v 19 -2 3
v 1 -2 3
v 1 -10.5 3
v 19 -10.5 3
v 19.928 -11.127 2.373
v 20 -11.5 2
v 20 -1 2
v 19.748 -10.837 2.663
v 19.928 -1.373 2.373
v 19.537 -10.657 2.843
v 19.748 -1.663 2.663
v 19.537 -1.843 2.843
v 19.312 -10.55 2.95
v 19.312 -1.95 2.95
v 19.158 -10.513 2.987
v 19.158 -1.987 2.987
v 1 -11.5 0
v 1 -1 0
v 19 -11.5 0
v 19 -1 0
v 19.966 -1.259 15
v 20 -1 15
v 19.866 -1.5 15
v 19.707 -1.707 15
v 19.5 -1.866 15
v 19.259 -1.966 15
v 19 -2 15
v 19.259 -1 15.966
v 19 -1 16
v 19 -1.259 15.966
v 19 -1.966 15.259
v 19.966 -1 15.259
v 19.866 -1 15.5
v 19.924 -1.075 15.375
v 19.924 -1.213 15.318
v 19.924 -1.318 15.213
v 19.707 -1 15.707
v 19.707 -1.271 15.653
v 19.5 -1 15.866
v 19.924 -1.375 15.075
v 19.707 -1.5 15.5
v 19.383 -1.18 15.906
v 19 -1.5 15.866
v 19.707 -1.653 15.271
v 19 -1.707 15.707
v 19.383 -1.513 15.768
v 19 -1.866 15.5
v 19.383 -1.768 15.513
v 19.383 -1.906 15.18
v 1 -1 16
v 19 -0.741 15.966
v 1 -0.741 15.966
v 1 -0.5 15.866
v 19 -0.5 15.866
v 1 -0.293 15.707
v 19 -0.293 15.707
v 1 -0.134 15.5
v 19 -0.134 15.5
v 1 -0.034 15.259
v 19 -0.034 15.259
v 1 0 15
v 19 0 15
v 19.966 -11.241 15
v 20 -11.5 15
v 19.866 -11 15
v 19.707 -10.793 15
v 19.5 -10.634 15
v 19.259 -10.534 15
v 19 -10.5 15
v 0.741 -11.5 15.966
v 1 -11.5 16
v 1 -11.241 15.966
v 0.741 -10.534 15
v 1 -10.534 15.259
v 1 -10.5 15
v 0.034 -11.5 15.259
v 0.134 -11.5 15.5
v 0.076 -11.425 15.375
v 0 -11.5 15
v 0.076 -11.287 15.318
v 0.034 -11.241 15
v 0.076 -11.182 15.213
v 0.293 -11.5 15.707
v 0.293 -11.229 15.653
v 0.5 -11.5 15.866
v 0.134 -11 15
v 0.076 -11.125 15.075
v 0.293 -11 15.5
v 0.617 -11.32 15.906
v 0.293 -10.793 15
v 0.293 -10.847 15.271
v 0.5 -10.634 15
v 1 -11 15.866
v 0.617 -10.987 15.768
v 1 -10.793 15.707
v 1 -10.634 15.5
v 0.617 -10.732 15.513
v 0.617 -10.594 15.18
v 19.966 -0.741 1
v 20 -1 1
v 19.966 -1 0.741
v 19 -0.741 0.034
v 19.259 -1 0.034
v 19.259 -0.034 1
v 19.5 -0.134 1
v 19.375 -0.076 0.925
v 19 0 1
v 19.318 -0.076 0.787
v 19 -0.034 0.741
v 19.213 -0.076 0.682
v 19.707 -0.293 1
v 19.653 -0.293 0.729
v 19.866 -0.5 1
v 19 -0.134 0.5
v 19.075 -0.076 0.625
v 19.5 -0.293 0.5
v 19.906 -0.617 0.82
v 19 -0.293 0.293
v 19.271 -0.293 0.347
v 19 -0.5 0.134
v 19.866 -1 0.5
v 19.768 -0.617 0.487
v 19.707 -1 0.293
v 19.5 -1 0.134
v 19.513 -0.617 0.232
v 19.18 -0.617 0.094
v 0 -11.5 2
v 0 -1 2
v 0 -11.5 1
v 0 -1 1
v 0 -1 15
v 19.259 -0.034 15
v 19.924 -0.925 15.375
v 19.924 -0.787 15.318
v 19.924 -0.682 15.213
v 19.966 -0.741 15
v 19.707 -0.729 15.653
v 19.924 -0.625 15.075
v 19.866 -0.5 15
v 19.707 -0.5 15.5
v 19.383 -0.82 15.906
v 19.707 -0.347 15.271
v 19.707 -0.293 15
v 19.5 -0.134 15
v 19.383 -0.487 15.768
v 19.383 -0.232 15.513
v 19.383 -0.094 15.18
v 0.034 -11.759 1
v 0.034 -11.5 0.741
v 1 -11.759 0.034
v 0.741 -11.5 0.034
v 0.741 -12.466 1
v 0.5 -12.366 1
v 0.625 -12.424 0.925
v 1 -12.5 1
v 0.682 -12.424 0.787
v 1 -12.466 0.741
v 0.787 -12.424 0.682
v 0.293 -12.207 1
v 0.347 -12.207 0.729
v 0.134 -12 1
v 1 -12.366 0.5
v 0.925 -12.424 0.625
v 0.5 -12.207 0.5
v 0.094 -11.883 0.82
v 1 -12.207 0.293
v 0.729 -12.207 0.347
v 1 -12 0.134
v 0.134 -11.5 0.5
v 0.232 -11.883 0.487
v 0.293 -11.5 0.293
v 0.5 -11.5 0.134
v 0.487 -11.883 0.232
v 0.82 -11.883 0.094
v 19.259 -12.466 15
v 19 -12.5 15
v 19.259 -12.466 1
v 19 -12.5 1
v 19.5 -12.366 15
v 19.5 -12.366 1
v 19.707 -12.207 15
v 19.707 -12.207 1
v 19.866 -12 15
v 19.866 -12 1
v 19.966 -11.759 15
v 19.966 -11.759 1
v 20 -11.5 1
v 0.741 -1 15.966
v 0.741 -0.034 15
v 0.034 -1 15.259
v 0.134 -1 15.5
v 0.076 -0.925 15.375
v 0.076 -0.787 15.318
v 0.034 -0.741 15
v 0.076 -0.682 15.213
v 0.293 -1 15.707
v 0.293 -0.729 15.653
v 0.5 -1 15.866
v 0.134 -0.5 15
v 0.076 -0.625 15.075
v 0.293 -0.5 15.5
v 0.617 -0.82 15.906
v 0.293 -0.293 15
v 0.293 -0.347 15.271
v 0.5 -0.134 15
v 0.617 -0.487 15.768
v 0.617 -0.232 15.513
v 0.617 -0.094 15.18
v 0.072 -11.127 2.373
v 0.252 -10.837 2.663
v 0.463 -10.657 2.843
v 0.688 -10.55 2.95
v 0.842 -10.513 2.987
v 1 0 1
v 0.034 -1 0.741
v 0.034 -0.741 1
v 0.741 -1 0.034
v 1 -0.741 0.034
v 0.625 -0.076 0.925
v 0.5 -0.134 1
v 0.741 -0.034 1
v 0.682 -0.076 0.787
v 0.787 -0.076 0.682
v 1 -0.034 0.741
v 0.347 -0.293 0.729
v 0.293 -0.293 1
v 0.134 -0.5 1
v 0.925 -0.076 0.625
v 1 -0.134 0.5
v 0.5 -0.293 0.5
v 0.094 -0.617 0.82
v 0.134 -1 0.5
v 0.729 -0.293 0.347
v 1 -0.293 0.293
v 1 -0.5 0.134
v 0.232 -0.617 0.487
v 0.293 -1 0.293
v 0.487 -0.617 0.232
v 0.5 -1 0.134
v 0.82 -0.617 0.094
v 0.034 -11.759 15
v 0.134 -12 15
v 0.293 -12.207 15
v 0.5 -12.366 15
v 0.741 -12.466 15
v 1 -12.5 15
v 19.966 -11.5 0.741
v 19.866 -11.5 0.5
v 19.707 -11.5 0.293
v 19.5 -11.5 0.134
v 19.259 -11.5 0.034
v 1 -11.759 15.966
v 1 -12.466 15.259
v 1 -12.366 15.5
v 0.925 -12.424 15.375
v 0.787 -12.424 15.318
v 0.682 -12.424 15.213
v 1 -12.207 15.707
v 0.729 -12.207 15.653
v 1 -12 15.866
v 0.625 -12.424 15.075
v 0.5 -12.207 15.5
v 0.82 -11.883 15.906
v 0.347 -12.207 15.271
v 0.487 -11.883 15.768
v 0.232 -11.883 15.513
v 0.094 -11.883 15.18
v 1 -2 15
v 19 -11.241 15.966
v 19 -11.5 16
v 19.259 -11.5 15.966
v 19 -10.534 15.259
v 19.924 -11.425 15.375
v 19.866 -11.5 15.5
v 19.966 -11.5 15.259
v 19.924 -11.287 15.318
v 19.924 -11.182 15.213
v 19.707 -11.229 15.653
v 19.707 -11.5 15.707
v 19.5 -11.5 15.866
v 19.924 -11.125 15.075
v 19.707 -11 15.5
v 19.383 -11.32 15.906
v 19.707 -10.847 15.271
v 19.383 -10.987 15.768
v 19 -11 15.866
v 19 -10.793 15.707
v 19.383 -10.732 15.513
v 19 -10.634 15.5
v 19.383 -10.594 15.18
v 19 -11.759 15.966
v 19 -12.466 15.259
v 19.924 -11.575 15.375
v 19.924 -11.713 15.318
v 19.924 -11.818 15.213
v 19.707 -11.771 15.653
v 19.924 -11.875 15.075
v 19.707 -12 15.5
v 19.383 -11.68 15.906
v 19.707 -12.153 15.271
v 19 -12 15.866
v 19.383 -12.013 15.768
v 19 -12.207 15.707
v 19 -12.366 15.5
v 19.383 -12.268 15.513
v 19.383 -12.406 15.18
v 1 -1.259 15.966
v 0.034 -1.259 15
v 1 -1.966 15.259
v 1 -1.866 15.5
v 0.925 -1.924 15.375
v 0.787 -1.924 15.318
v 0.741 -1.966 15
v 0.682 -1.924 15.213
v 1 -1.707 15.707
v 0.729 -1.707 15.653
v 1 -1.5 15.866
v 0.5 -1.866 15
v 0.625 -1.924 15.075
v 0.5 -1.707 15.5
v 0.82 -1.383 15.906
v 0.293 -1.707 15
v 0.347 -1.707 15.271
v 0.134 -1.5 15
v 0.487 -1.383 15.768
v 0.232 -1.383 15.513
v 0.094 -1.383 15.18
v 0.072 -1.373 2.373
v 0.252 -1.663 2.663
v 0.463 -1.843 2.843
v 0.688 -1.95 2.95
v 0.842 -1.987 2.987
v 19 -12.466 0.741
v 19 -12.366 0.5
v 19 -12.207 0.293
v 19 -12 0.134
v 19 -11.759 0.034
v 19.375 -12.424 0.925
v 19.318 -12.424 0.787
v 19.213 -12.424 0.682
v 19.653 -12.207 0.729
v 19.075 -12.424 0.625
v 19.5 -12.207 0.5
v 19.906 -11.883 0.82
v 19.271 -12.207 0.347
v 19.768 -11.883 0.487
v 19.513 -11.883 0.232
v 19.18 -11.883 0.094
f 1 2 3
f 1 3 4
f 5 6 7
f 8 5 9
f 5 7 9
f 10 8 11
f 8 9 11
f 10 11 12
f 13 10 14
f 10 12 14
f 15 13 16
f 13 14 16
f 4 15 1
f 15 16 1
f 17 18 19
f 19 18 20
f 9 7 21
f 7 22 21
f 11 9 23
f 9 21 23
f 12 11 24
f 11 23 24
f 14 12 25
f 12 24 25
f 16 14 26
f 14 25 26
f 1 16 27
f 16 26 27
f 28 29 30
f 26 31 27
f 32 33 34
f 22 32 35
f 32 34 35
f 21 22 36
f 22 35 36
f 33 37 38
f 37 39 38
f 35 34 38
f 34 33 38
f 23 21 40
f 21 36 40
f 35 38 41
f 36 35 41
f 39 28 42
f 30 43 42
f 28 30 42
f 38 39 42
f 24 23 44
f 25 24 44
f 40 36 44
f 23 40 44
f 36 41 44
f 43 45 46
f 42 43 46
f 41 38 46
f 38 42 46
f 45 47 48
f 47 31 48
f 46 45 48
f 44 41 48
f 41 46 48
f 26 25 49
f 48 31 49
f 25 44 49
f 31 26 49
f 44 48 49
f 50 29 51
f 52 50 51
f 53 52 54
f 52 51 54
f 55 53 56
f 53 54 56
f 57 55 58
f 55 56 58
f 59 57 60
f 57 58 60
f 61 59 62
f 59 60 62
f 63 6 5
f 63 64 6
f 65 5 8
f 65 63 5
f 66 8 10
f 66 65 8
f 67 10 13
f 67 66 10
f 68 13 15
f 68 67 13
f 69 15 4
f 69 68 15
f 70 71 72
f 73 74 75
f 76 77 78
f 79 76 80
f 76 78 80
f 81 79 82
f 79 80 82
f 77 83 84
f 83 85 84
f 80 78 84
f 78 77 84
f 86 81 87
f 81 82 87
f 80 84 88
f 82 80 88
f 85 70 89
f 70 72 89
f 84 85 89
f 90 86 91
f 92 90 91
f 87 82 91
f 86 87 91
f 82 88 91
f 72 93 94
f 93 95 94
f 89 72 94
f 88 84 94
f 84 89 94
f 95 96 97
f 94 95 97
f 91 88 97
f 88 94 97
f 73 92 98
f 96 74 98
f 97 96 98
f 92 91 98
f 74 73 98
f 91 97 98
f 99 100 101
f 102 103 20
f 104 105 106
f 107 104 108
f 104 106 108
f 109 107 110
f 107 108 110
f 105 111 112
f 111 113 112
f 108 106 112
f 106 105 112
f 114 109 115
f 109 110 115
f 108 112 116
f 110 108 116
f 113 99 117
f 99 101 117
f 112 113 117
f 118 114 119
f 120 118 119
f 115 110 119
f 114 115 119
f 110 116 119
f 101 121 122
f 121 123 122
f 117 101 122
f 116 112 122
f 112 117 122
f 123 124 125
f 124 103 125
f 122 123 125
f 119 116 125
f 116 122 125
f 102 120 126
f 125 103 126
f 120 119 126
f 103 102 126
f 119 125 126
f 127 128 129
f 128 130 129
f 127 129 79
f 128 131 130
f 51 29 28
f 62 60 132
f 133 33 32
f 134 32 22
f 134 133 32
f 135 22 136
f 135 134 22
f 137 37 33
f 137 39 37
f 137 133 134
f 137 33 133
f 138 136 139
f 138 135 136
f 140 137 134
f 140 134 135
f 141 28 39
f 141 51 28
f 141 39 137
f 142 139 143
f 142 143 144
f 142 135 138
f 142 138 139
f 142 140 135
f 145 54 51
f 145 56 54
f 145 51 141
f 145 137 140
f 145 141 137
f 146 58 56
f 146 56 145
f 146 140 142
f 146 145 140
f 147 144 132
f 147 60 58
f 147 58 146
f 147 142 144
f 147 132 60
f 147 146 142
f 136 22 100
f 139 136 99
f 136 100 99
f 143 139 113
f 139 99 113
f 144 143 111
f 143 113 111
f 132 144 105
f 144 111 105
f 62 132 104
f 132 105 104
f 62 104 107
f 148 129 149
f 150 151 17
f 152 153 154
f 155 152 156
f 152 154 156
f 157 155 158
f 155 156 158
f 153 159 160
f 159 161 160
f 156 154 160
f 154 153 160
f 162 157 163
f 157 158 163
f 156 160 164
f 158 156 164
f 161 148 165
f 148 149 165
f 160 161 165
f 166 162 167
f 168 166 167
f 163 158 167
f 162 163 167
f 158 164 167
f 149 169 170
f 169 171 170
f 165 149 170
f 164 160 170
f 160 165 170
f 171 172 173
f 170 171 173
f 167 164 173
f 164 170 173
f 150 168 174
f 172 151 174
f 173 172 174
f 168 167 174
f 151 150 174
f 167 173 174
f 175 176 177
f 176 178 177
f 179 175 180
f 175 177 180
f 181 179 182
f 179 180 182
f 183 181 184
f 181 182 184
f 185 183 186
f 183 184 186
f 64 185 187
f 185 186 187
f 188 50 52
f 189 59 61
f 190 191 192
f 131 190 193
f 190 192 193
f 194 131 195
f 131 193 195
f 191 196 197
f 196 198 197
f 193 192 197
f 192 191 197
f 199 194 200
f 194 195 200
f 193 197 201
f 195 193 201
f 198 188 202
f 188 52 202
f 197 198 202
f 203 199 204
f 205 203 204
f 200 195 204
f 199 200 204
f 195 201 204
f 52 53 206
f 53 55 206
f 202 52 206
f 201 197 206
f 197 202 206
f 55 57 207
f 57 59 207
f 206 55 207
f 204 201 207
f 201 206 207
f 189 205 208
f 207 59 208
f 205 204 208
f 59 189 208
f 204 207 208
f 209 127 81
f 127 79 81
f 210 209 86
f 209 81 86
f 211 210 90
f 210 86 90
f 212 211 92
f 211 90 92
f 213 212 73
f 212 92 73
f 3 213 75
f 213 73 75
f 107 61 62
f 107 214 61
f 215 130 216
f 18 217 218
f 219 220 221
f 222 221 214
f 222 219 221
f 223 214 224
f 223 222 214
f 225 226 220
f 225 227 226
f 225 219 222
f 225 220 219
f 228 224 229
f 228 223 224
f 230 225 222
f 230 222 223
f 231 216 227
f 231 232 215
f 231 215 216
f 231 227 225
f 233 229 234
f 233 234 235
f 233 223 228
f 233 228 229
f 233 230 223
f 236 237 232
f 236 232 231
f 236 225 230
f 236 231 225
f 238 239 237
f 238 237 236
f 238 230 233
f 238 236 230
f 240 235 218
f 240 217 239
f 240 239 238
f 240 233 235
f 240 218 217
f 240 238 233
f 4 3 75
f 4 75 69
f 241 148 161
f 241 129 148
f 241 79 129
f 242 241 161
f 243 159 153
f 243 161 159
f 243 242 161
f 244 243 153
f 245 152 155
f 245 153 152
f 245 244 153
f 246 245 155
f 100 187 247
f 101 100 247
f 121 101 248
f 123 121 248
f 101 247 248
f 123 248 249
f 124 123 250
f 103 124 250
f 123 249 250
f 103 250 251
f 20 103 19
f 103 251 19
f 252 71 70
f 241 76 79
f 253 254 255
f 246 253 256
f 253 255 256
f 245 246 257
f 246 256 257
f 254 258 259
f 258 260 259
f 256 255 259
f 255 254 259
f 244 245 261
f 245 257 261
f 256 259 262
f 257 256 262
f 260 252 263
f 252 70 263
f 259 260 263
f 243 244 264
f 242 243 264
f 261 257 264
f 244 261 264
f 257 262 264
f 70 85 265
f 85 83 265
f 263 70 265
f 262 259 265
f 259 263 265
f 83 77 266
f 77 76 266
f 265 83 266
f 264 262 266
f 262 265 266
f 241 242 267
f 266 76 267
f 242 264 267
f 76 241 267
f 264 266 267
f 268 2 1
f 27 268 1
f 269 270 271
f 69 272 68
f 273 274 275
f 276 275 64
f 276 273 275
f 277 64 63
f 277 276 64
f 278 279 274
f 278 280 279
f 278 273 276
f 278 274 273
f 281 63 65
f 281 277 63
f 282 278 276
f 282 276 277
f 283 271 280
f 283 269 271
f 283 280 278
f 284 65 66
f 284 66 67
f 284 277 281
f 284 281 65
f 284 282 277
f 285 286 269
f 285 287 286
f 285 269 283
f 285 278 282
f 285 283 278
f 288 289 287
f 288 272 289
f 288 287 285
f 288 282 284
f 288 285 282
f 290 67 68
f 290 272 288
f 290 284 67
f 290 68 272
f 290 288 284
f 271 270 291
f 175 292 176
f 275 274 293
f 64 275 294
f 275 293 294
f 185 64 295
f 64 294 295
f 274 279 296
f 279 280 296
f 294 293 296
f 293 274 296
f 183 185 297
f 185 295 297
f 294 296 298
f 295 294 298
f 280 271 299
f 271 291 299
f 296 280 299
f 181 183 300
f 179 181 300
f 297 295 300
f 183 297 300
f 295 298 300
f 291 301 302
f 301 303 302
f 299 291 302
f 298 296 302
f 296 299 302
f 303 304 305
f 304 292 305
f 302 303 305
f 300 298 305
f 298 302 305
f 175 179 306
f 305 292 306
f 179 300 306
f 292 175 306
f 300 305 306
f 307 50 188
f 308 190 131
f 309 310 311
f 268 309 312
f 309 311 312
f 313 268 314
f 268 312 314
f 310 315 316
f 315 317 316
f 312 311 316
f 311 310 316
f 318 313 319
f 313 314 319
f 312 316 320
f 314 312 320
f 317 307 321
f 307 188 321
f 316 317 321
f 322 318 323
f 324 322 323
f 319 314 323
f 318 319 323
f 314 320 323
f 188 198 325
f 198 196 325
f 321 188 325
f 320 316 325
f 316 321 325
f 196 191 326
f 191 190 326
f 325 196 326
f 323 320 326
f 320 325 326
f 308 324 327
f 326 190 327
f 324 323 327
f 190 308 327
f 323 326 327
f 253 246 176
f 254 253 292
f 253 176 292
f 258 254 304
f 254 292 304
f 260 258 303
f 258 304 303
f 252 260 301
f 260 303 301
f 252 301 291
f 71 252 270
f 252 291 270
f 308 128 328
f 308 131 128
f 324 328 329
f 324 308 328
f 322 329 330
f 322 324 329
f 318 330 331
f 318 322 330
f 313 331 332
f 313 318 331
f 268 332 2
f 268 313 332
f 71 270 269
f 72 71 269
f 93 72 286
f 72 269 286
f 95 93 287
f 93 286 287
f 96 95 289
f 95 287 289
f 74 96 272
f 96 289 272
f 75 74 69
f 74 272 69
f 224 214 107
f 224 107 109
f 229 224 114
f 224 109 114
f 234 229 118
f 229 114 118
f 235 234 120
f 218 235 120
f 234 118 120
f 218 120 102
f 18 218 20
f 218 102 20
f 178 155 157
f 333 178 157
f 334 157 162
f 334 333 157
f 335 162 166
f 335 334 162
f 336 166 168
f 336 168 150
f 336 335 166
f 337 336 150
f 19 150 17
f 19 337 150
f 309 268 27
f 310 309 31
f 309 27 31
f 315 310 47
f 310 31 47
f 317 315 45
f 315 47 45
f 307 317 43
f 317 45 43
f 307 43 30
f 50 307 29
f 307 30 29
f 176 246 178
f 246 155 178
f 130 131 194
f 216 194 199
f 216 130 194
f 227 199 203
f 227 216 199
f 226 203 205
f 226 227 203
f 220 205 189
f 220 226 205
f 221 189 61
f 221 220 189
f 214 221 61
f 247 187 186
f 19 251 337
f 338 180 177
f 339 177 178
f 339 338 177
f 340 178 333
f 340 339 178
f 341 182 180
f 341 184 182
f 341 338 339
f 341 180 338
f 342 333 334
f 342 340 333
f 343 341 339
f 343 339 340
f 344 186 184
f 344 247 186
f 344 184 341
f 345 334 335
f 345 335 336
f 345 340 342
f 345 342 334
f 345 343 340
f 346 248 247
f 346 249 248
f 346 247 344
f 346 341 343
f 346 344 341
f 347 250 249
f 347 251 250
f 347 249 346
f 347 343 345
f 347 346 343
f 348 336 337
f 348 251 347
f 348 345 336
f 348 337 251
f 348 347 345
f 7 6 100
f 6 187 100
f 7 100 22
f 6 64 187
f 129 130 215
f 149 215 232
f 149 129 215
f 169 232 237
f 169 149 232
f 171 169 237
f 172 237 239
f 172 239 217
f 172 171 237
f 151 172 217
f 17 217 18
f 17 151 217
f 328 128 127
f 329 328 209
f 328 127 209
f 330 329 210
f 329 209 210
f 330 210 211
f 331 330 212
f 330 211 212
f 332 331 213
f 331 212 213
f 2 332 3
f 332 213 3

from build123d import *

# Parameters (mm, degrees)
F0_W     = 20
F0_H     = 2
F0_H_2   = 8.5
F1_DEPTH = 3
F2_DEPTH = 16
F3_R     = 0.99999


# Not quite as in the source:
# - a fillet or chamfer is up to 0.001 mm smaller than in the source, because OpenCascade refuses the exact size


with BuildPart() as f1:
    # F0 (on Top) → F1 (new body)
    with BuildSketch(Plane.XY):
        with Locations((10, -1)):
            Rectangle(F0_W, F0_H)
        with Locations((10, -6.25)):
            Rectangle(F0_W, F0_H_2)
        with Locations((10, -11.5)):
            Rectangle(F0_W, F0_H)
    extrude(amount=F1_DEPTH)

    # F0 (on Top) → F2 (join)
    with BuildSketch(Plane.XY):
        with Locations((10, -1)):
            Rectangle(F0_W, F0_H)
        with Locations((10, -11.5)):
            Rectangle(F0_W, F0_H)
    extrude(amount=F2_DEPTH)

    # F3 (radius 1 in the source; OpenCascade refuses exactly that, so slightly less here)
    f3_edges = [f1.edges().sort_by_distance(p)[0] for p in [
        (10, 0, 16),
        (0, -1, 16),
        (10, -2, 16),
        (20, -1, 16),
        (10, -10.5, 16),
        (0, -11.5, 16),
        (10, -12.5, 16),
        (20, -11.5, 16),
        (0, -6.25, 0),
        (0, 0, 8),
        (0, -2, 9.5),
        (0, -6.25, 3),
        (0, -10.5, 9.5),
        (0, -12.5, 8),
        (20, -6.25, 0),
        (20, -12.5, 8),
        (20, -10.5, 9.5),
        (20, -6.25, 3),
        (20, -2, 9.5),
        (20, 0, 8),
        (10, 0, 0),
        (10, -12.5, 0),
    ]]
    fillet(f3_edges, radius=F3_R)


solid = f1.part
